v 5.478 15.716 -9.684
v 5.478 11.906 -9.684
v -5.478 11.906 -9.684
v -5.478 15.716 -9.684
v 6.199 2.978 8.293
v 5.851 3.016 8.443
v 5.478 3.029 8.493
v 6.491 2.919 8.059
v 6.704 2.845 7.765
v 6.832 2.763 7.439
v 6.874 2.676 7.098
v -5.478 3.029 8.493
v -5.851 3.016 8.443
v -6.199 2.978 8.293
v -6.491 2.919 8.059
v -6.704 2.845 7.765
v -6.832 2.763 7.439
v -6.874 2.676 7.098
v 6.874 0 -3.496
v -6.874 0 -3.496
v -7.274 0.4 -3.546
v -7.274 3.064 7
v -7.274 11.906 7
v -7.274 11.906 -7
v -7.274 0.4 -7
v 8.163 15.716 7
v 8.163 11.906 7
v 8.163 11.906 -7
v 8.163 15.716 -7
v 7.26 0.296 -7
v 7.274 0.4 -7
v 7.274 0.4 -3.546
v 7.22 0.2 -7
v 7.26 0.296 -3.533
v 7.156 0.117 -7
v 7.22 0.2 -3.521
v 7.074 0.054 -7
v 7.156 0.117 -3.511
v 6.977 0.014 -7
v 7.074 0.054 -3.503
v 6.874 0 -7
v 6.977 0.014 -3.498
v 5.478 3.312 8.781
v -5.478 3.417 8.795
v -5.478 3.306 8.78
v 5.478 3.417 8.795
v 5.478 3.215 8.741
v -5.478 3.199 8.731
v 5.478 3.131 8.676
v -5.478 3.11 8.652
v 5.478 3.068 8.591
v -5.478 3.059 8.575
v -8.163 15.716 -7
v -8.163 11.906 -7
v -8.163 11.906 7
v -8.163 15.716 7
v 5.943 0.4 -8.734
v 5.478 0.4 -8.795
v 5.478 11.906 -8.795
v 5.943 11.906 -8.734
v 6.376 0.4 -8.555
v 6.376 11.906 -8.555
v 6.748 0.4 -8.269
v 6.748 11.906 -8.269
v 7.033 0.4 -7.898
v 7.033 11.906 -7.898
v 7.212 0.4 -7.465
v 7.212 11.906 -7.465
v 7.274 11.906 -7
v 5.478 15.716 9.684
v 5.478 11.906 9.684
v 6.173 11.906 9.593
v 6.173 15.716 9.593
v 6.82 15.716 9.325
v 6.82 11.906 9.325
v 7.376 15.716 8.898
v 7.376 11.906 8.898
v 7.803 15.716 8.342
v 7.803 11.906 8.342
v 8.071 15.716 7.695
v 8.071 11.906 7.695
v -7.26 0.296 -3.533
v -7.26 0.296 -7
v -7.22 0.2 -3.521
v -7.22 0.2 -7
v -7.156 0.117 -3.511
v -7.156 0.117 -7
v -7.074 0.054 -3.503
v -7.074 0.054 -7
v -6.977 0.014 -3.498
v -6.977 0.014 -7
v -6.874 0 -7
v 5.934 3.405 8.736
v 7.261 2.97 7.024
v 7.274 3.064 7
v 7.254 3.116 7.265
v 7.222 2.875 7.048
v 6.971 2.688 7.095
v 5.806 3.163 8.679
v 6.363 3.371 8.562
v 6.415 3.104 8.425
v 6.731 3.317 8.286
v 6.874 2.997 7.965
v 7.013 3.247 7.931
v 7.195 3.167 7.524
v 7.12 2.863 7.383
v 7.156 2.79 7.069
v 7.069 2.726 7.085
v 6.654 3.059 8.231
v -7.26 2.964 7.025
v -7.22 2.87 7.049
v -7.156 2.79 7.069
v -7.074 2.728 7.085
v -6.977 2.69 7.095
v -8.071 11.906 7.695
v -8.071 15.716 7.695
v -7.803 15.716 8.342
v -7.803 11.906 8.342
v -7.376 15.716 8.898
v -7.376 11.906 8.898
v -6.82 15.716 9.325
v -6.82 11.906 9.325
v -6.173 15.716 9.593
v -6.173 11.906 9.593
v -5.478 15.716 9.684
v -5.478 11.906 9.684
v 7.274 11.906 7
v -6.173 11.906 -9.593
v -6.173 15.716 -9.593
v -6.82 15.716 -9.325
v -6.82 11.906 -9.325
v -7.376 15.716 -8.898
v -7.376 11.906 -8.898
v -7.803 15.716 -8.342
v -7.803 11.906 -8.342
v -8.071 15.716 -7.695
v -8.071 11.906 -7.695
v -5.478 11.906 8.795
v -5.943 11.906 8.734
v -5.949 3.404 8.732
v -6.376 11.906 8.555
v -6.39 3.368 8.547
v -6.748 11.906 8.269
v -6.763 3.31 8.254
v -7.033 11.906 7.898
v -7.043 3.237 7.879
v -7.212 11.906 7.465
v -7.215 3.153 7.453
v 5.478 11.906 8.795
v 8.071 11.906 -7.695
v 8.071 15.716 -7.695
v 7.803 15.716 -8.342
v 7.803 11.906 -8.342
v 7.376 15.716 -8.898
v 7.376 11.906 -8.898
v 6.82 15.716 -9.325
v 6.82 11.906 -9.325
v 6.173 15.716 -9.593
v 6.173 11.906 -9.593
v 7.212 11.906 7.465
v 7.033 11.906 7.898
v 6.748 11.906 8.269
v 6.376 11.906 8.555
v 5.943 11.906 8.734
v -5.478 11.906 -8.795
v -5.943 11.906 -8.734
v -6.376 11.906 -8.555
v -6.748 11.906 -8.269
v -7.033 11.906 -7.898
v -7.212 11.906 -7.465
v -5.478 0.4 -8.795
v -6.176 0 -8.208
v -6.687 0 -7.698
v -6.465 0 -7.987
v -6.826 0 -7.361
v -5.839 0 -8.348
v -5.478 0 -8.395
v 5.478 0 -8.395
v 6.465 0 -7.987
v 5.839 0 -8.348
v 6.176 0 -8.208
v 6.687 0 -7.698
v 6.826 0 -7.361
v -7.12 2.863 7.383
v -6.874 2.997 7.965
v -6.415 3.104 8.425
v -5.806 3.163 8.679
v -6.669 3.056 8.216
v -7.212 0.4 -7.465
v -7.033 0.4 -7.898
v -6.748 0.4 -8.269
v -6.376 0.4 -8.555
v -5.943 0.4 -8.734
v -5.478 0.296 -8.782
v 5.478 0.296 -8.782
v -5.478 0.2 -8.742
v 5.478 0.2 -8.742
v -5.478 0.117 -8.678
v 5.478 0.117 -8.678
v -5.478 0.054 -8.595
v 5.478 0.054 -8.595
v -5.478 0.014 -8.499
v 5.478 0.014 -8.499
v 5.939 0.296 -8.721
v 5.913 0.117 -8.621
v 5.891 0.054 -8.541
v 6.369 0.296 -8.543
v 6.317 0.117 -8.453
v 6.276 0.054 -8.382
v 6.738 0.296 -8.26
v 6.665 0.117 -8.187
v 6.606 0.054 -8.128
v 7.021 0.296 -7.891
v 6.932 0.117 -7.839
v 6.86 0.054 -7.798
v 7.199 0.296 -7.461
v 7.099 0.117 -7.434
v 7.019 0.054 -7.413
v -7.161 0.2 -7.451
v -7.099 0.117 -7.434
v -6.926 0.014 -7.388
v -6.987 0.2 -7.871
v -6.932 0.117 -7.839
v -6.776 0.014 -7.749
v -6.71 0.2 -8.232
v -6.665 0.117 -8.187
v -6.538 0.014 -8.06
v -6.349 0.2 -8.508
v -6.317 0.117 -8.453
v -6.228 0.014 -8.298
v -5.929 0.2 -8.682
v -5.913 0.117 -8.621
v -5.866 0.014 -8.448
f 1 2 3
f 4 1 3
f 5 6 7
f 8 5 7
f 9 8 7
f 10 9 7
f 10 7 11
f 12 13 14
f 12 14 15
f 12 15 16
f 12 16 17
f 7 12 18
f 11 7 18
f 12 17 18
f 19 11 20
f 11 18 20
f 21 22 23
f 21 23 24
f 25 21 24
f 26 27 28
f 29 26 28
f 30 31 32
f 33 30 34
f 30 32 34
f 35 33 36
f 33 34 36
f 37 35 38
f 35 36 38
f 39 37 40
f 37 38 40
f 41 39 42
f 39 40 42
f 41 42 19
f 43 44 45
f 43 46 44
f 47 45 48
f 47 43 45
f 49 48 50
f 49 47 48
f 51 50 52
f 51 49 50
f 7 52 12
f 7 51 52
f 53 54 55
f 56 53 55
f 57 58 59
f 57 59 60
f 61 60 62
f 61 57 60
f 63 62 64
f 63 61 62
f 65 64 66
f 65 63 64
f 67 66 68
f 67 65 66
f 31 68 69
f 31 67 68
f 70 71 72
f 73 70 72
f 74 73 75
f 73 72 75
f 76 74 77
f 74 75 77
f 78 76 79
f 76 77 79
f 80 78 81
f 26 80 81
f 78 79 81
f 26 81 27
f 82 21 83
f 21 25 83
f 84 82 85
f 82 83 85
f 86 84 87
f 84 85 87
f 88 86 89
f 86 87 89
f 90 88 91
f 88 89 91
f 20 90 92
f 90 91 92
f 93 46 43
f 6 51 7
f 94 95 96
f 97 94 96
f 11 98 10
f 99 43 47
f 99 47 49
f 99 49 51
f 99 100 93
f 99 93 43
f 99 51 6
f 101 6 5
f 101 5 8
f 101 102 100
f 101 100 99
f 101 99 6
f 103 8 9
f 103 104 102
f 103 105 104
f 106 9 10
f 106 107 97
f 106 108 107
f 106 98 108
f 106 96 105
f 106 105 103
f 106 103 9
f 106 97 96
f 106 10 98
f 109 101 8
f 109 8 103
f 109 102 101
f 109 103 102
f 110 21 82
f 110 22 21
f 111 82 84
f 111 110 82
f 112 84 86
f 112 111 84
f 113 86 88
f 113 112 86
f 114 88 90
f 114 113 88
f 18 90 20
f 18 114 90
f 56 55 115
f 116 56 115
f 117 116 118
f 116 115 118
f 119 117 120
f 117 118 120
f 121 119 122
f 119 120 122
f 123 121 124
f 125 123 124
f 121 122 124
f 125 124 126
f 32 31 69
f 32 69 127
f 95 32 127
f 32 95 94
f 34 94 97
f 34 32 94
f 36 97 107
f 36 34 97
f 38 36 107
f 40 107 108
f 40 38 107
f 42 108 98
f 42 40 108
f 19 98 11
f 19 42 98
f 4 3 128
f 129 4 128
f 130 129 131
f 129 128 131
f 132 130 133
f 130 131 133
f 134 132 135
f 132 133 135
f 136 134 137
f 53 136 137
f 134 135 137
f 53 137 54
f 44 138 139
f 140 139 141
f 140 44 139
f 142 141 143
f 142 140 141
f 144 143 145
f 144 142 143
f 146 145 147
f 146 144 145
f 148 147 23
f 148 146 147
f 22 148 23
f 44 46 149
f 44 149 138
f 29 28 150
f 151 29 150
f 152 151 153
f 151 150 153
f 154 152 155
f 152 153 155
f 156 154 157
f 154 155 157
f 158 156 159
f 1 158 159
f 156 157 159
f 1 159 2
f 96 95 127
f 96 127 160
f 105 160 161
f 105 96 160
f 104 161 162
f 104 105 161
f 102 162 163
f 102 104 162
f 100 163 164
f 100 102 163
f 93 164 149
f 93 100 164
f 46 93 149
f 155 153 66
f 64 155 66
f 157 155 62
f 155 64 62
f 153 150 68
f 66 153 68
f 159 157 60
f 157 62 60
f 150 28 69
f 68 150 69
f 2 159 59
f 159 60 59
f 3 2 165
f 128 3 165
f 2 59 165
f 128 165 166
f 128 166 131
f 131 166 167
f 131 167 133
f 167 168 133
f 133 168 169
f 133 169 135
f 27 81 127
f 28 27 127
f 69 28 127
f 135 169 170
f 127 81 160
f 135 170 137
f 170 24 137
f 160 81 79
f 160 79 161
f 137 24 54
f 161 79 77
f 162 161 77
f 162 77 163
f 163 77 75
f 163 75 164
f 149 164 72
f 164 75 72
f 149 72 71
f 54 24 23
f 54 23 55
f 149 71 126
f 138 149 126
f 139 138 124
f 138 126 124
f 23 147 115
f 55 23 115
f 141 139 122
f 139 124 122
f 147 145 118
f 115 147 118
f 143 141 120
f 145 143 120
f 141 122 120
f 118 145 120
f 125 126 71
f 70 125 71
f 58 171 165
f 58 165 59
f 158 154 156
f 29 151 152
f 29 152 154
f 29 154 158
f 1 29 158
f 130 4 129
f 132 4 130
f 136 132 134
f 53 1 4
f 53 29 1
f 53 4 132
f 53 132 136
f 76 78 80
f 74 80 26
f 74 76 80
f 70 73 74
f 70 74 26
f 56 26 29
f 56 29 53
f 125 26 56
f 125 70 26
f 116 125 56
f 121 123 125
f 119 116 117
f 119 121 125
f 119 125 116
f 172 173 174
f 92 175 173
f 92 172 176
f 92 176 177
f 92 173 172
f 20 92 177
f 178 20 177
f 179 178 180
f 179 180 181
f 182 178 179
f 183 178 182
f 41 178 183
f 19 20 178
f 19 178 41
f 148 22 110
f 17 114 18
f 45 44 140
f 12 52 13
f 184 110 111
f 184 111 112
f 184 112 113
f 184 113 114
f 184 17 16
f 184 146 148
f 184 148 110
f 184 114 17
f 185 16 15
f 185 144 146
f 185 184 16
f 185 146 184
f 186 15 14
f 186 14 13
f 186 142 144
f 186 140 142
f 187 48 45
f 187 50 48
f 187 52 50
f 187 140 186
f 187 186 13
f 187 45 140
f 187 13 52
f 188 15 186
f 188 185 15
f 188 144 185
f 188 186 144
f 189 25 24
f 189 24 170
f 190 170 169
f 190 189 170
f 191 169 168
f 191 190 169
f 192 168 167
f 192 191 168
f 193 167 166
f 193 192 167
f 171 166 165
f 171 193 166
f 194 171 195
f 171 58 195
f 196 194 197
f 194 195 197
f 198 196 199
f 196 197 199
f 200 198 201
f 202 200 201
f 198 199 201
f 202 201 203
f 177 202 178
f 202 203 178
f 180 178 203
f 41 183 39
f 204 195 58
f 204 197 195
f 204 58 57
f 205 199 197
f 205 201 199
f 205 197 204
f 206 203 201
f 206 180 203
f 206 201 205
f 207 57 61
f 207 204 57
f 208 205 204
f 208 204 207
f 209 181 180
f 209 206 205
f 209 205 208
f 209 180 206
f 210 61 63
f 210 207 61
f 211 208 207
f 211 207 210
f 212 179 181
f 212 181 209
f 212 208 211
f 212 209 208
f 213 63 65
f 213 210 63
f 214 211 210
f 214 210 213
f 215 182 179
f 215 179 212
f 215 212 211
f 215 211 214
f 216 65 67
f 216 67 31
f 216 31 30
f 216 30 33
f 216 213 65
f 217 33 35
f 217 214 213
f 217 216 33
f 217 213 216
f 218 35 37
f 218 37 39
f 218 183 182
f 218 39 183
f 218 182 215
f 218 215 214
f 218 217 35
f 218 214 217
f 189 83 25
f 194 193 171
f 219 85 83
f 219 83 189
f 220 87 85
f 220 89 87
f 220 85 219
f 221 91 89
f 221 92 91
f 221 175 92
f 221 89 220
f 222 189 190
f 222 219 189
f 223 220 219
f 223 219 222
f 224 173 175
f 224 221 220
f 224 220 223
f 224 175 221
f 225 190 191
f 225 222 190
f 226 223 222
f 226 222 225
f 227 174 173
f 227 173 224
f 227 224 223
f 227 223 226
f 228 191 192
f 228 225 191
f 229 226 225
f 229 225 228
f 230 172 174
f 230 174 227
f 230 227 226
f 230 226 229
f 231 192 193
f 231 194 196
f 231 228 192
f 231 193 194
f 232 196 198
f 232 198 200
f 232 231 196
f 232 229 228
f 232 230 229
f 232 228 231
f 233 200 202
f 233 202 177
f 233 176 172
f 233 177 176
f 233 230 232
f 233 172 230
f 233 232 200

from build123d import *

# Parameters (mm, degrees)
F1_DEPTH = 11.906
F3_DEPTH = 3.81
F5_DEPTH = 14.54711
F7_R     = 0.4


with BuildPart() as f1:
    # F0 (on Front) → F1 (new body)
    with BuildSketch(Plane.XZ):
        with BuildLine():
            Line((5.478281, 8.795274), (-5.478281, 8.795274))
            ThreePointArc((-5.478281, 8.795274), (-6.747731, 8.26945), (-7.273555, 7))
            Line((-7.273555, 7), (-7.273555, -7))
            ThreePointArc((-7.273555, -7), (-6.747731, -8.26945), (-5.478281, -8.795274))
            Line((-5.478281, -8.795274), (5.478281, -8.795274))
            ThreePointArc((5.478281, -8.795274), (6.747731, -8.26945), (7.273555, -7))
            Line((7.273555, -7), (7.273555, 7))
            ThreePointArc((7.273555, 7), (6.747731, 8.26945), (5.478281, 8.795274))
        make_face()
    extrude(amount=-F1_DEPTH)

    # F2 (on face) → F3 (join)
    with BuildSketch(Plane(origin=(0, 11.906, 0), x_dir=(-1, 0, 0), z_dir=(0, 1, 0))):
        with BuildLine():
            ThreePointArc((8.162555, 7), (7.376349, 8.898068), (5.478281, 9.684274))
            Line((5.478281, 9.684274), (-5.478281, 9.684274))
            ThreePointArc((-5.478281, 9.684274), (-7.376349, 8.898068), (-8.162555, 7))
            Line((-8.162555, 7), (-8.162555, -7))
            ThreePointArc((-8.162555, -7), (-7.376349, -8.898068), (-5.478281, -9.684274))
            Line((-5.478281, -9.684274), (5.478281, -9.684274))
            ThreePointArc((5.478281, -9.684274), (7.376349, -8.898068), (8.162555, -7))
            Line((8.162555, -7), (8.162555, 7))
        make_face()
    extrude(amount=F3_DEPTH)

    # F4 (on face) → F5 (cut, through all)
    with BuildSketch(Plane(origin=(-7.273555, 0, 0), x_dir=(0, -1, 0), z_dir=(-1, 0, 0))):
        Polygon((0, -3.496099), (0, 7), (0, 8.795274), (-3.105232, 8.795274), align=None)
    extrude(amount=-F5_DEPTH, mode=Mode.SUBTRACT)

    # F7
    f7_edges = [f1.edges().sort_by_distance(p)[0] for p in [
        (0, 3.105232, 8.795274),
        (6.757507, 2.969901, 8.259598),
        (7.273555, 1.325841, 1.75195),
        (7.273555, 0, -5.24805),
        (6.747731, 0, -8.26945),
        (0, 0, -8.795274),
        (-7.273555, 0, -5.24805),
        (-6.747731, 0, -8.26945),
        (-7.273555, 1.325841, 1.75195),
        (-6.757507, 2.969901, 8.259598),
    ]]
    fillet(f7_edges, radius=F7_R)


solid = f1.part
